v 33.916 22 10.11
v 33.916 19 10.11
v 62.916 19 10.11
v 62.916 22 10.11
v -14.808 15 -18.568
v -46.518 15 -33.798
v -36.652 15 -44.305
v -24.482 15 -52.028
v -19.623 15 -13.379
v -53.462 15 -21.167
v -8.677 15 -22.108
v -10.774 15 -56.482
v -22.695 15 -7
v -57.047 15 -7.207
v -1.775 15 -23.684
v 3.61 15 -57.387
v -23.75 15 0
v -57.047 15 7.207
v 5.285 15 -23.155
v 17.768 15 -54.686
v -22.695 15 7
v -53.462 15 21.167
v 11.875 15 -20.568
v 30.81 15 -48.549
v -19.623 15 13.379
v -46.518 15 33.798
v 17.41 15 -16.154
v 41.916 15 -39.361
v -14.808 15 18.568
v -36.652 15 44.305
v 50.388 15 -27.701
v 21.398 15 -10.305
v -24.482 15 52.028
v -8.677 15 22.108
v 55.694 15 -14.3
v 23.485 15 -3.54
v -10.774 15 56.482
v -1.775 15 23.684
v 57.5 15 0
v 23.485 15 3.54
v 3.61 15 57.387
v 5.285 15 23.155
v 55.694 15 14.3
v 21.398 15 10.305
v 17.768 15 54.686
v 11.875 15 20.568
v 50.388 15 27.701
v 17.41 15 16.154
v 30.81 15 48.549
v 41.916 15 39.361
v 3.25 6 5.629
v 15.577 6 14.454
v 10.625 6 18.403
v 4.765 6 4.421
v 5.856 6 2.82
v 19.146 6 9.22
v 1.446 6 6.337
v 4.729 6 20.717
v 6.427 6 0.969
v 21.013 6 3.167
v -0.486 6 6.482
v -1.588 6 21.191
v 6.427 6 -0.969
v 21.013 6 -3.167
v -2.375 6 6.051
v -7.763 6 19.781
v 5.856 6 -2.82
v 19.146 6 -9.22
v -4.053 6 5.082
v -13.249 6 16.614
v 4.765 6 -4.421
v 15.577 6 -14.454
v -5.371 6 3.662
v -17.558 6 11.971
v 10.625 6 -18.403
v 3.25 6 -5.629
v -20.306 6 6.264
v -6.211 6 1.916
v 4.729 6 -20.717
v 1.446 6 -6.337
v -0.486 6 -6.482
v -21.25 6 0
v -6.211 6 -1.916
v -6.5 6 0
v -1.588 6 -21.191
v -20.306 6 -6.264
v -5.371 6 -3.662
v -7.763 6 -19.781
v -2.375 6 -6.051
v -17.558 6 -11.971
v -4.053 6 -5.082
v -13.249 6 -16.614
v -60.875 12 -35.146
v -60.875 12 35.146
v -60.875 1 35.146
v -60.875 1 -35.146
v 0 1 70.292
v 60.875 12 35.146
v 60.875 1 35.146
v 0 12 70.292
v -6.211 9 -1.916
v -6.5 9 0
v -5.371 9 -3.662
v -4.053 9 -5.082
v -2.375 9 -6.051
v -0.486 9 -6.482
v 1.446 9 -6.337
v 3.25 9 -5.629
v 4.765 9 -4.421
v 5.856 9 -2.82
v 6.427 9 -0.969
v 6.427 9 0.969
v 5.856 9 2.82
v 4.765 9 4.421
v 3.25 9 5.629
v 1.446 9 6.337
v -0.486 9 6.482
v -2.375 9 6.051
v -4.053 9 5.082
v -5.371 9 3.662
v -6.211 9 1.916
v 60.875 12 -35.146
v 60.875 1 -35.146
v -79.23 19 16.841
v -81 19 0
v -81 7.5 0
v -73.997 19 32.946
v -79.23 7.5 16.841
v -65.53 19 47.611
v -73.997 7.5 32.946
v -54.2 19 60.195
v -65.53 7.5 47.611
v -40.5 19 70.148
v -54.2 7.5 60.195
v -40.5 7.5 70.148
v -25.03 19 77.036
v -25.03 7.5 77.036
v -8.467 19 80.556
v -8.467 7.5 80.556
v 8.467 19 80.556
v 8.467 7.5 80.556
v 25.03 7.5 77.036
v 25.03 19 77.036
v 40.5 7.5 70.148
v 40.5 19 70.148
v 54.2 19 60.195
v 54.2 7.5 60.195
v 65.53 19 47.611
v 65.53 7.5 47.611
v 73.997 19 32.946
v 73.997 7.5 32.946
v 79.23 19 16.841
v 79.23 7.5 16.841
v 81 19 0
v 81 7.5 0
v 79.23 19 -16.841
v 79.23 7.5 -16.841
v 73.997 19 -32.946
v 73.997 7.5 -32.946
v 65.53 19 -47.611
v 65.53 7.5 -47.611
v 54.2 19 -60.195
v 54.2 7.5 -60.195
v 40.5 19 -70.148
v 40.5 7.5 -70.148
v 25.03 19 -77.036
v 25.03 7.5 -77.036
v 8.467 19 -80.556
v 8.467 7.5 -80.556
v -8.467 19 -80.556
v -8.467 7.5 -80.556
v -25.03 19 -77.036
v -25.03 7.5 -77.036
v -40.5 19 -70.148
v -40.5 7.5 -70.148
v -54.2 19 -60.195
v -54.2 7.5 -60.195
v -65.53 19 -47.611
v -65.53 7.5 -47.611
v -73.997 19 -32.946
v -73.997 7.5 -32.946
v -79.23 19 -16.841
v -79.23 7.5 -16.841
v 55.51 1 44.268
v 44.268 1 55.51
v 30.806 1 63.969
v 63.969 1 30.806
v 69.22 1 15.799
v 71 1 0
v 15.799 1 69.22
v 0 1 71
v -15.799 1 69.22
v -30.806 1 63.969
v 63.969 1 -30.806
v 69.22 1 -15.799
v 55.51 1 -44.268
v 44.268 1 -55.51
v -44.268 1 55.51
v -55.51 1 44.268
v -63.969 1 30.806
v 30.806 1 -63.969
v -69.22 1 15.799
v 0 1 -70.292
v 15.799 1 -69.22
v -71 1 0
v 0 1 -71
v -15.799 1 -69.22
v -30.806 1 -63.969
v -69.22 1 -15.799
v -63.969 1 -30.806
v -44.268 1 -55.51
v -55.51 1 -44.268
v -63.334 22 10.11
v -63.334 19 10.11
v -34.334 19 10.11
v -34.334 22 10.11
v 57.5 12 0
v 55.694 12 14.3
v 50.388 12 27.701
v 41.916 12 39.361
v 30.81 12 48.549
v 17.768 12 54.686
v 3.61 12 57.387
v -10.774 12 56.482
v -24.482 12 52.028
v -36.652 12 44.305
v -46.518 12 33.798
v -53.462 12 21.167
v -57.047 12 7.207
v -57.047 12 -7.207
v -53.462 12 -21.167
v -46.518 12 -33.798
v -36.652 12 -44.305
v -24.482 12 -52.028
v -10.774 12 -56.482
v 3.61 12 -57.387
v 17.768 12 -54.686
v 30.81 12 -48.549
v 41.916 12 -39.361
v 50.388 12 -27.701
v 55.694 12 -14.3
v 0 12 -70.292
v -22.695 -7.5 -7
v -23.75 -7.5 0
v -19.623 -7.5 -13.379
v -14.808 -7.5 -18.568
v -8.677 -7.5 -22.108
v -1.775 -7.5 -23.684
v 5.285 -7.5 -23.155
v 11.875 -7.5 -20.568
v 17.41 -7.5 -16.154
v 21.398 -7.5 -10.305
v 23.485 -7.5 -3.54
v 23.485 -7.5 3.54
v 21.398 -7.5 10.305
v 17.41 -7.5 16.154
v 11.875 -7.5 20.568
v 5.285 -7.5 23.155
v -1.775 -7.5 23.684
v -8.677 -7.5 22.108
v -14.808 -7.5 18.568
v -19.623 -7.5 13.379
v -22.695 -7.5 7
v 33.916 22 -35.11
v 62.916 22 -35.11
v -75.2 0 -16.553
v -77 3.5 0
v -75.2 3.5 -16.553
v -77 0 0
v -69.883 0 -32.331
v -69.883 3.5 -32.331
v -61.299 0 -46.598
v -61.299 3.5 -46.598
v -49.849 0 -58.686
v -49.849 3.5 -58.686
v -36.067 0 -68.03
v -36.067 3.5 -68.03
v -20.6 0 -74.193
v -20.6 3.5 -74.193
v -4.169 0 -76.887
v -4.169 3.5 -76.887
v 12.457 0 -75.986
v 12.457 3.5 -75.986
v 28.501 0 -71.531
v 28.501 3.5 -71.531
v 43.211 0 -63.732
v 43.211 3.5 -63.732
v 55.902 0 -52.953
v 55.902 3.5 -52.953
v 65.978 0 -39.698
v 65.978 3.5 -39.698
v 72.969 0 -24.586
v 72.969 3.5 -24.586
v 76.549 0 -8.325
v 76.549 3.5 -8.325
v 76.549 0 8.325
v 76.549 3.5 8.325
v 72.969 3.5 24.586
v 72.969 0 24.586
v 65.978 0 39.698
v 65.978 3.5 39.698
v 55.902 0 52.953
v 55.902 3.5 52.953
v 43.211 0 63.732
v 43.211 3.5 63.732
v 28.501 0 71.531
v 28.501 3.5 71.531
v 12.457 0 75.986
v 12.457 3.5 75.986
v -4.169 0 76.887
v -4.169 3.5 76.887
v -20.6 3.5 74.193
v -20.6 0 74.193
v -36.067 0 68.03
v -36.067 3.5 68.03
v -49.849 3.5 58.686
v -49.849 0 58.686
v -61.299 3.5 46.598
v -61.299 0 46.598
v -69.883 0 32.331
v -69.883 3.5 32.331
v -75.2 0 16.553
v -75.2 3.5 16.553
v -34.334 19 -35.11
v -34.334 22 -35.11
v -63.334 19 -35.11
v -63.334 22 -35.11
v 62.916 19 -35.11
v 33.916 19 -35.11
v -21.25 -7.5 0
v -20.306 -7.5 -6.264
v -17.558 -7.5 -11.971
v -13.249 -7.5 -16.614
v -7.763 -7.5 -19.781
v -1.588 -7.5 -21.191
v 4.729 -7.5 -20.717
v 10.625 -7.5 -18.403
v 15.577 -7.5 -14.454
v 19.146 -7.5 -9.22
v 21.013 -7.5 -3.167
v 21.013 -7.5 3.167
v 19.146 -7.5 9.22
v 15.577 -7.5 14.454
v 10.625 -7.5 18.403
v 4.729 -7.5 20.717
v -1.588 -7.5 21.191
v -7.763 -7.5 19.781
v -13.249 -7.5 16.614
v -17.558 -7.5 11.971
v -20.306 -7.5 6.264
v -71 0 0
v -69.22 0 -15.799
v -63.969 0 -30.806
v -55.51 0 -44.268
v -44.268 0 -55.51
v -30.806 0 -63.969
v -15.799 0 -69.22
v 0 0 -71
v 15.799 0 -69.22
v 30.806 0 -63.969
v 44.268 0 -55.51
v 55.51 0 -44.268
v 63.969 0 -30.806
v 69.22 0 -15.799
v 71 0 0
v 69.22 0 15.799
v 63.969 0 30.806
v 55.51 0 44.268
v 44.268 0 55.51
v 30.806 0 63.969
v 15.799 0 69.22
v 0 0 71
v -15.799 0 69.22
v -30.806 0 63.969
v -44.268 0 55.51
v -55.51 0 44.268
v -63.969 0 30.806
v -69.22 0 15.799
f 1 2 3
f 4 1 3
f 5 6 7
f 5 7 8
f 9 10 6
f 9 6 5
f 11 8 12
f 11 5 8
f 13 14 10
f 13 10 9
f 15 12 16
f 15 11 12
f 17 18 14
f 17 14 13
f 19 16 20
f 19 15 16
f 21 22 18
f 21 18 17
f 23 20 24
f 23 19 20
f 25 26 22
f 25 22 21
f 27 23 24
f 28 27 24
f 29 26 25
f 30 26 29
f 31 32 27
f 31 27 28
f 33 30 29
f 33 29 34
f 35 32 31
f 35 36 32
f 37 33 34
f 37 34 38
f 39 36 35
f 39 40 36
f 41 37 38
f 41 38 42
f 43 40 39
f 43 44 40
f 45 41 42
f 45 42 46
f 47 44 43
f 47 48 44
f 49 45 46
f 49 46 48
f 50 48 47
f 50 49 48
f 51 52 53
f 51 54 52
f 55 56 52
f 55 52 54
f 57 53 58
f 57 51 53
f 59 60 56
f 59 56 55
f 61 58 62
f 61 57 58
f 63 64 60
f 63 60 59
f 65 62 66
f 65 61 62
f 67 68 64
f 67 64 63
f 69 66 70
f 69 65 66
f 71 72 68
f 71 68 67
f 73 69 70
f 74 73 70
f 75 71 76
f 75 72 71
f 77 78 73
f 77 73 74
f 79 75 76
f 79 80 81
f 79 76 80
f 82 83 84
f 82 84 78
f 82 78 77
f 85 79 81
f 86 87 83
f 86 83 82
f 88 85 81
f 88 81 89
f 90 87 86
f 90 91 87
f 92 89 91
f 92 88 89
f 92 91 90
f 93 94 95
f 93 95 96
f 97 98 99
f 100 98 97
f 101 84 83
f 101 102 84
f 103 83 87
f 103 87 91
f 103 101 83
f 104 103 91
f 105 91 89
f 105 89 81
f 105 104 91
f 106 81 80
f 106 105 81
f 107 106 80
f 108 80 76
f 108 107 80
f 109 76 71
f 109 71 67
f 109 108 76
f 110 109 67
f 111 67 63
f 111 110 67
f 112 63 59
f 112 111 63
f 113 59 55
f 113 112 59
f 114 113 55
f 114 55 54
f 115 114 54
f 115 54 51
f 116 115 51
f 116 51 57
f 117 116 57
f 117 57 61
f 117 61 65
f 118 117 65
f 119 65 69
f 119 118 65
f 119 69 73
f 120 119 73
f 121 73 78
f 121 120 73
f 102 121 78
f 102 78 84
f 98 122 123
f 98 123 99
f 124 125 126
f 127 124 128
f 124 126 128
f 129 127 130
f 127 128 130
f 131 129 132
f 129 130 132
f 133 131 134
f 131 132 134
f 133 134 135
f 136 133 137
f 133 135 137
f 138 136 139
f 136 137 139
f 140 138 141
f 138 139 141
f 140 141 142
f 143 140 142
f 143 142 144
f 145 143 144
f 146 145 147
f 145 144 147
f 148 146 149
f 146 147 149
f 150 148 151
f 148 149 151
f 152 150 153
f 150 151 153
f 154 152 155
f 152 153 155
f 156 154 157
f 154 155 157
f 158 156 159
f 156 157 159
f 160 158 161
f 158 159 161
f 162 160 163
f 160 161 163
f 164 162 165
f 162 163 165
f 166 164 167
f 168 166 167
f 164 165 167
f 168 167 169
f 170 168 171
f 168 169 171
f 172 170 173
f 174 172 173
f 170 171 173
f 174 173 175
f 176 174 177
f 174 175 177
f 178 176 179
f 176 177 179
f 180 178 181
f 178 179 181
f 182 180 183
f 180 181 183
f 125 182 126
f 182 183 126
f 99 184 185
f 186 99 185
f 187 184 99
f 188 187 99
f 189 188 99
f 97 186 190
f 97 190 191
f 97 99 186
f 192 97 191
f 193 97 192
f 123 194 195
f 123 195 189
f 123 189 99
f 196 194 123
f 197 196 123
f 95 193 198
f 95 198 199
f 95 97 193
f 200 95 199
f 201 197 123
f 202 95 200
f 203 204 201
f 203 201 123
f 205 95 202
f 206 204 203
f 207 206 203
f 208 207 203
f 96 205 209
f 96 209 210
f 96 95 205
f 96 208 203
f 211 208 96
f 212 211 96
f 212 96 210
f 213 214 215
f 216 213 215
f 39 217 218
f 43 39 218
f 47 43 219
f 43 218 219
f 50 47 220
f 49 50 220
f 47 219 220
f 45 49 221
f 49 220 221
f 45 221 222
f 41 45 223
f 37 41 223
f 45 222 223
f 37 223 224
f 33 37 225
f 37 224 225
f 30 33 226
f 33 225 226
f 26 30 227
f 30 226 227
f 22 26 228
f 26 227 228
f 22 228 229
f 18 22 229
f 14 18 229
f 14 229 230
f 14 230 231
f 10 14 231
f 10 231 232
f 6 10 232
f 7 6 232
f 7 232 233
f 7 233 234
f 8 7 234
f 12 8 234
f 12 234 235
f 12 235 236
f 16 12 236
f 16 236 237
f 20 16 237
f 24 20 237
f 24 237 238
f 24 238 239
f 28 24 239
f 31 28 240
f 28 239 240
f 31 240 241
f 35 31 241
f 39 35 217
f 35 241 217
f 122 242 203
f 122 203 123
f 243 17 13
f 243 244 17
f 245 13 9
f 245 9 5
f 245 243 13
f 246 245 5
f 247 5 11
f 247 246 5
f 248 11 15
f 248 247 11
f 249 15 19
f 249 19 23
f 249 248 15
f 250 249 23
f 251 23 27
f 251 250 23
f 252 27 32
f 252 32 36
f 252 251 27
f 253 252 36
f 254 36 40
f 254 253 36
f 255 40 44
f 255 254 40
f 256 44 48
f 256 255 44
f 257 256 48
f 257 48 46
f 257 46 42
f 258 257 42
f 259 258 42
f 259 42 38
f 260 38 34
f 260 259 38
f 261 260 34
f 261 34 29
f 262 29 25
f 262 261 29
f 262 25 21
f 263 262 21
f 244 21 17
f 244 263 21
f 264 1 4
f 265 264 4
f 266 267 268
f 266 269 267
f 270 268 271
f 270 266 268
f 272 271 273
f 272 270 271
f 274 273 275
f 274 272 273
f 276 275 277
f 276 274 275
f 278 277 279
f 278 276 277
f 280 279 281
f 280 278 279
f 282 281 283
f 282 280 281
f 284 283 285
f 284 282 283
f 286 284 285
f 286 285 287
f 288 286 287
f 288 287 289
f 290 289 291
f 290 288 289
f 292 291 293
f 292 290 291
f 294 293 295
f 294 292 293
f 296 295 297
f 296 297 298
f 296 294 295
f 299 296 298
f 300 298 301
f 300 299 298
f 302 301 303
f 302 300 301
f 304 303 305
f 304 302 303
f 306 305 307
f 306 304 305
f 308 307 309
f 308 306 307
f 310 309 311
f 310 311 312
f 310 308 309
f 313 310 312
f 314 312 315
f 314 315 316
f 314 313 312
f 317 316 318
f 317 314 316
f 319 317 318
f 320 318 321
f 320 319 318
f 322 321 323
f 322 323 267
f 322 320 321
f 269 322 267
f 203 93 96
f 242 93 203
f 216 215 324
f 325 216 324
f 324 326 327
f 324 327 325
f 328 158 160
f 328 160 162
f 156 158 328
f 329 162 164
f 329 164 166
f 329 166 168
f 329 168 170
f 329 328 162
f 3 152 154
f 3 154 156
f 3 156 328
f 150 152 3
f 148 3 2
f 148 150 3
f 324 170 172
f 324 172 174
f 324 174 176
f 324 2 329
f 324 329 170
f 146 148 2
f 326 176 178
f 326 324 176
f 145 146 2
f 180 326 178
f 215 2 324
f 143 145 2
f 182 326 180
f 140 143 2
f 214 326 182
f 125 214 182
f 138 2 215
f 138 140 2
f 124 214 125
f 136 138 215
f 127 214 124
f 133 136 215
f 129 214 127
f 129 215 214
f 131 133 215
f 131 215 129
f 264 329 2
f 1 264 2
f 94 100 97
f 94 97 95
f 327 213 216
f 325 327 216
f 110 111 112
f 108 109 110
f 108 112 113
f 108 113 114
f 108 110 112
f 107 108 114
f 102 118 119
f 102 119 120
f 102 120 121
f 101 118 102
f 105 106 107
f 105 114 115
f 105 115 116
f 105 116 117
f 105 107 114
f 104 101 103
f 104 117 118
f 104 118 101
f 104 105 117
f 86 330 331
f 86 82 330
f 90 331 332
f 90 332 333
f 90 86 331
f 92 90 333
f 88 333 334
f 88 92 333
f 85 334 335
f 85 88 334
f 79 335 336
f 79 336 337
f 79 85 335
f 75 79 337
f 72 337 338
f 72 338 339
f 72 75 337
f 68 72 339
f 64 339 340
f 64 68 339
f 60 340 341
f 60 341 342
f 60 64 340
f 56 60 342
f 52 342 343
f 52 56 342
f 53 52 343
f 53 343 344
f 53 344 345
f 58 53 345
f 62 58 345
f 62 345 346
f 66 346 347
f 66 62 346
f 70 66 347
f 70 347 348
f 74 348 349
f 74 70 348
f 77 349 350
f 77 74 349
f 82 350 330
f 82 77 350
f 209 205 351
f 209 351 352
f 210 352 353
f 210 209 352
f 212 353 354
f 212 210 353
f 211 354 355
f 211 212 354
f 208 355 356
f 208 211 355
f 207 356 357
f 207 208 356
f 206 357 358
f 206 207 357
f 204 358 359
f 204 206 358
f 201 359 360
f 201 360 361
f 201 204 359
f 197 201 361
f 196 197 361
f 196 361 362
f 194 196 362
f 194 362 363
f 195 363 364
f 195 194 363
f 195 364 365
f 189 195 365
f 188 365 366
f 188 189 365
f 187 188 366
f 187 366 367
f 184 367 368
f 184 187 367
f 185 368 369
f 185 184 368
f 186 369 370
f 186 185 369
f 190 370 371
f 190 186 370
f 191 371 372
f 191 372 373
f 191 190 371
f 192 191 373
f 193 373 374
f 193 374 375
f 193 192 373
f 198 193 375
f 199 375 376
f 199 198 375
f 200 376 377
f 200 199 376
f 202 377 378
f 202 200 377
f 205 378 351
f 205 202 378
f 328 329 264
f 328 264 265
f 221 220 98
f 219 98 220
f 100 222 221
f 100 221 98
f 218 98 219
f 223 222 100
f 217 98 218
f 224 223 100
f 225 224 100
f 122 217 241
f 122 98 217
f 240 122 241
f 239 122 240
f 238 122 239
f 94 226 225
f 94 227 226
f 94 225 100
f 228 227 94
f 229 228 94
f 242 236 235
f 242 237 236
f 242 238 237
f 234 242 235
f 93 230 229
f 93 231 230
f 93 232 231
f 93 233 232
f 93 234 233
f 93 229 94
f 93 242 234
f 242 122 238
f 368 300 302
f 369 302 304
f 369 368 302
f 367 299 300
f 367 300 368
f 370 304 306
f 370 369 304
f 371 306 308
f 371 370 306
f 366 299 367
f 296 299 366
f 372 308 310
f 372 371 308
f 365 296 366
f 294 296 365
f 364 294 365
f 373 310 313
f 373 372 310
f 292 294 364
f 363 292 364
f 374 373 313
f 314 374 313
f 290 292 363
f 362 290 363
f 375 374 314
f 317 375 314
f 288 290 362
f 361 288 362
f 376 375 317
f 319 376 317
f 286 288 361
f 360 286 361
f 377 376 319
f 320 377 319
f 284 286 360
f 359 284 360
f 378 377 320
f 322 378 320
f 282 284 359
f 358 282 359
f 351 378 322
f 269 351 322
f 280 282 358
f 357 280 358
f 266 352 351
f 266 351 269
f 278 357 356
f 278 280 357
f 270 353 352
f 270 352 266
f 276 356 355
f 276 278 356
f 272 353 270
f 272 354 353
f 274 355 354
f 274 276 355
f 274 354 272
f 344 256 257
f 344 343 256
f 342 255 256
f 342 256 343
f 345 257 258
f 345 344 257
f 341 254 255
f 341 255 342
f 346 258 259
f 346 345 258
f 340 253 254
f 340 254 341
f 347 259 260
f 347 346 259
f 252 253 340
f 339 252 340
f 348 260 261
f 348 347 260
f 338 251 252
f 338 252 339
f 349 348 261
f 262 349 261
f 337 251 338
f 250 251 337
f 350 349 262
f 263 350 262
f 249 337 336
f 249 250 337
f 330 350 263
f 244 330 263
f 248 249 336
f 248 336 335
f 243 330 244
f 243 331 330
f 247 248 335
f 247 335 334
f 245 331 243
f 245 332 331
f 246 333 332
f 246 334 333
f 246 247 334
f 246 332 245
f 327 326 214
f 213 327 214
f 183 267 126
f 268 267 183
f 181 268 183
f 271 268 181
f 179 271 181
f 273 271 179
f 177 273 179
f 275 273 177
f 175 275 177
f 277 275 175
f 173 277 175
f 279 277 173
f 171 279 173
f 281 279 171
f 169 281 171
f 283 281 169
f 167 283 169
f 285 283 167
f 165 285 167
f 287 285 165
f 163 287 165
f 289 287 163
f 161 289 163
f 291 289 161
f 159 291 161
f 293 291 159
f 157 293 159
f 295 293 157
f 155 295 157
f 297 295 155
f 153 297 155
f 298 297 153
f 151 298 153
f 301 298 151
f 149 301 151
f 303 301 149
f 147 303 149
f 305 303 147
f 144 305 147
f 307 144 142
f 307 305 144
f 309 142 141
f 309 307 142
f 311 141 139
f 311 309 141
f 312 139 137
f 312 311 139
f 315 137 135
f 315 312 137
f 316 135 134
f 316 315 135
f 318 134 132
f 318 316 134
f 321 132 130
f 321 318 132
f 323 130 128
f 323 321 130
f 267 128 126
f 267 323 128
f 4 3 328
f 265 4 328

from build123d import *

# Parameters (mm, degrees)
SKETCH2_R           = 71
BOSS_EXTRUDE1_DEPTH = 11
SKETCH12_R          = 57.5
SKETCH12_R_2        = 23.75
CUT_EXTRUDE8_DEPTH  = 1
CUT_EXTRUDE9_START  = -10
SKETCH10_R          = 85
SKETCH10_R_2        = 81
CUT_EXTRUDE9_DEPTH  = 10
SKETCH14_R          = 57.5
SKETCH14_R_2        = 23.75
BOSS_EXTRUDE2_DEPTH = 1
SKETCH15_R          = 81
BOSS_EXTRUDE3_DEPTH = 4
SKETCH16_R          = 57.5
SKETCH16_R_2        = 23.75
CUT_EXTRUDE11_DEPTH = 2
SKETCH17_W          = 29
SKETCH17_H          = 10.11
SKETCH17_H_2        = 35.11
BOSS_EXTRUDE4_DEPTH = 3


with BuildPart() as part:
    # Sketch1 → Revolve1 (revolve)
    with BuildSketch(Plane.XY, mode=Mode.PRIVATE) as revolve1_sk:
        Polygon((0, 12), (0, 15), (85, 15), (85, 10.5), (84, 10.5), (77, 3.5), (77, 0), (71, 0), (71, 12), (23.75, 12), (23.75, -7.5), (21.25, -7.5), (21.25, 6), (6.5, 6), (6.5, 9), (0, 9), align=None)
    revolve(revolve1_sk.sketch.rotate(Axis((0, 12, 0), (0, -1, 0)), 180), axis=Axis((0, 12, 0), (0, -1, 0)))

    # Sketch2 → Boss-Extrude1 (add)
    with BuildSketch(Plane.XZ.offset(-12)):
        with Locations(Location((0, 0, 0), (0, 0, 180))):
            Circle(SKETCH2_R)
        Polygon((0, 70.292395274), (-60.875, 35.146197637), (-60.875, -35.146197637), (0, -70.292395274), (60.875, -35.146197637), (60.875, 35.146197637), align=None, mode=Mode.SUBTRACT)
    extrude(amount=BOSS_EXTRUDE1_DEPTH)

    # Sketch12 → Cut-Extrude8 (cut)
    with BuildSketch(Plane.XZ.offset(-12)):
        Circle(SKETCH12_R)
        with Locations(Location((0, 0, 0), (0, 0, 180))):
            Circle(SKETCH12_R_2, mode=Mode.SUBTRACT)
    extrude(amount=-CUT_EXTRUDE8_DEPTH, mode=Mode.SUBTRACT)

    # Sketch10 → Cut-Extrude9 (cut)
    with BuildSketch(Plane(origin=(0, 15, 0), x_dir=(1, 0, 0), z_dir=(0, 1, 0)).offset(CUT_EXTRUDE9_START)):
        Circle(SKETCH10_R)
        with Locations(Location((0, 0, 0), (0, 0, 180))):
            Circle(SKETCH10_R_2, mode=Mode.SUBTRACT)
    extrude(amount=CUT_EXTRUDE9_DEPTH, mode=Mode.SUBTRACT)

    # Sketch14 → Boss-Extrude2 (add)
    with BuildSketch(Plane(origin=(0, 13, 0), x_dir=(-1, 0, 0), z_dir=(0, -1, 0))):
        with Locations(Location((0, 0, 0), (0, 0, 180))):
            Circle(SKETCH14_R)
        Circle(SKETCH14_R_2, mode=Mode.SUBTRACT)
    extrude(amount=-BOSS_EXTRUDE2_DEPTH)

    # Sketch15 → Boss-Extrude3 (add)
    with BuildSketch(Plane(origin=(0, 15, 0), x_dir=(1, 0, 0), z_dir=(0, 1, 0))):
        with Locations(Location((0, 0, 0), (0, 0, 180))):
            Circle(SKETCH15_R)
    extrude(amount=BOSS_EXTRUDE3_DEPTH)

    # Sketch16 → Cut-Extrude11 (cut)
    with BuildSketch(Plane.XZ.offset(-13)):
        Circle(SKETCH16_R)
        with Locations(Location((0, 0, 0), (0, 0, 180))):
            Circle(SKETCH16_R_2, mode=Mode.SUBTRACT)
    extrude(amount=-CUT_EXTRUDE11_DEPTH, mode=Mode.SUBTRACT)

    # Sketch17 → Boss-Extrude4 (add)
    with BuildSketch(Plane(origin=(0, 19, 0), x_dir=(1, 0, 0), z_dir=(0, 1, 0))):
        with Locations((-48.833648901, -5.055)):
            Rectangle(SKETCH17_W, SKETCH17_H)
        with Locations((-48.833648901, 17.555)):
            Rectangle(SKETCH17_W, SKETCH17_H_2)
        with Locations((48.416351099, -5.055)):
            Rectangle(SKETCH17_W, SKETCH17_H)
        with Locations((48.416351099, 17.555)):
            Rectangle(SKETCH17_W, SKETCH17_H_2)
    extrude(amount=BOSS_EXTRUDE4_DEPTH)


solid = part.part
